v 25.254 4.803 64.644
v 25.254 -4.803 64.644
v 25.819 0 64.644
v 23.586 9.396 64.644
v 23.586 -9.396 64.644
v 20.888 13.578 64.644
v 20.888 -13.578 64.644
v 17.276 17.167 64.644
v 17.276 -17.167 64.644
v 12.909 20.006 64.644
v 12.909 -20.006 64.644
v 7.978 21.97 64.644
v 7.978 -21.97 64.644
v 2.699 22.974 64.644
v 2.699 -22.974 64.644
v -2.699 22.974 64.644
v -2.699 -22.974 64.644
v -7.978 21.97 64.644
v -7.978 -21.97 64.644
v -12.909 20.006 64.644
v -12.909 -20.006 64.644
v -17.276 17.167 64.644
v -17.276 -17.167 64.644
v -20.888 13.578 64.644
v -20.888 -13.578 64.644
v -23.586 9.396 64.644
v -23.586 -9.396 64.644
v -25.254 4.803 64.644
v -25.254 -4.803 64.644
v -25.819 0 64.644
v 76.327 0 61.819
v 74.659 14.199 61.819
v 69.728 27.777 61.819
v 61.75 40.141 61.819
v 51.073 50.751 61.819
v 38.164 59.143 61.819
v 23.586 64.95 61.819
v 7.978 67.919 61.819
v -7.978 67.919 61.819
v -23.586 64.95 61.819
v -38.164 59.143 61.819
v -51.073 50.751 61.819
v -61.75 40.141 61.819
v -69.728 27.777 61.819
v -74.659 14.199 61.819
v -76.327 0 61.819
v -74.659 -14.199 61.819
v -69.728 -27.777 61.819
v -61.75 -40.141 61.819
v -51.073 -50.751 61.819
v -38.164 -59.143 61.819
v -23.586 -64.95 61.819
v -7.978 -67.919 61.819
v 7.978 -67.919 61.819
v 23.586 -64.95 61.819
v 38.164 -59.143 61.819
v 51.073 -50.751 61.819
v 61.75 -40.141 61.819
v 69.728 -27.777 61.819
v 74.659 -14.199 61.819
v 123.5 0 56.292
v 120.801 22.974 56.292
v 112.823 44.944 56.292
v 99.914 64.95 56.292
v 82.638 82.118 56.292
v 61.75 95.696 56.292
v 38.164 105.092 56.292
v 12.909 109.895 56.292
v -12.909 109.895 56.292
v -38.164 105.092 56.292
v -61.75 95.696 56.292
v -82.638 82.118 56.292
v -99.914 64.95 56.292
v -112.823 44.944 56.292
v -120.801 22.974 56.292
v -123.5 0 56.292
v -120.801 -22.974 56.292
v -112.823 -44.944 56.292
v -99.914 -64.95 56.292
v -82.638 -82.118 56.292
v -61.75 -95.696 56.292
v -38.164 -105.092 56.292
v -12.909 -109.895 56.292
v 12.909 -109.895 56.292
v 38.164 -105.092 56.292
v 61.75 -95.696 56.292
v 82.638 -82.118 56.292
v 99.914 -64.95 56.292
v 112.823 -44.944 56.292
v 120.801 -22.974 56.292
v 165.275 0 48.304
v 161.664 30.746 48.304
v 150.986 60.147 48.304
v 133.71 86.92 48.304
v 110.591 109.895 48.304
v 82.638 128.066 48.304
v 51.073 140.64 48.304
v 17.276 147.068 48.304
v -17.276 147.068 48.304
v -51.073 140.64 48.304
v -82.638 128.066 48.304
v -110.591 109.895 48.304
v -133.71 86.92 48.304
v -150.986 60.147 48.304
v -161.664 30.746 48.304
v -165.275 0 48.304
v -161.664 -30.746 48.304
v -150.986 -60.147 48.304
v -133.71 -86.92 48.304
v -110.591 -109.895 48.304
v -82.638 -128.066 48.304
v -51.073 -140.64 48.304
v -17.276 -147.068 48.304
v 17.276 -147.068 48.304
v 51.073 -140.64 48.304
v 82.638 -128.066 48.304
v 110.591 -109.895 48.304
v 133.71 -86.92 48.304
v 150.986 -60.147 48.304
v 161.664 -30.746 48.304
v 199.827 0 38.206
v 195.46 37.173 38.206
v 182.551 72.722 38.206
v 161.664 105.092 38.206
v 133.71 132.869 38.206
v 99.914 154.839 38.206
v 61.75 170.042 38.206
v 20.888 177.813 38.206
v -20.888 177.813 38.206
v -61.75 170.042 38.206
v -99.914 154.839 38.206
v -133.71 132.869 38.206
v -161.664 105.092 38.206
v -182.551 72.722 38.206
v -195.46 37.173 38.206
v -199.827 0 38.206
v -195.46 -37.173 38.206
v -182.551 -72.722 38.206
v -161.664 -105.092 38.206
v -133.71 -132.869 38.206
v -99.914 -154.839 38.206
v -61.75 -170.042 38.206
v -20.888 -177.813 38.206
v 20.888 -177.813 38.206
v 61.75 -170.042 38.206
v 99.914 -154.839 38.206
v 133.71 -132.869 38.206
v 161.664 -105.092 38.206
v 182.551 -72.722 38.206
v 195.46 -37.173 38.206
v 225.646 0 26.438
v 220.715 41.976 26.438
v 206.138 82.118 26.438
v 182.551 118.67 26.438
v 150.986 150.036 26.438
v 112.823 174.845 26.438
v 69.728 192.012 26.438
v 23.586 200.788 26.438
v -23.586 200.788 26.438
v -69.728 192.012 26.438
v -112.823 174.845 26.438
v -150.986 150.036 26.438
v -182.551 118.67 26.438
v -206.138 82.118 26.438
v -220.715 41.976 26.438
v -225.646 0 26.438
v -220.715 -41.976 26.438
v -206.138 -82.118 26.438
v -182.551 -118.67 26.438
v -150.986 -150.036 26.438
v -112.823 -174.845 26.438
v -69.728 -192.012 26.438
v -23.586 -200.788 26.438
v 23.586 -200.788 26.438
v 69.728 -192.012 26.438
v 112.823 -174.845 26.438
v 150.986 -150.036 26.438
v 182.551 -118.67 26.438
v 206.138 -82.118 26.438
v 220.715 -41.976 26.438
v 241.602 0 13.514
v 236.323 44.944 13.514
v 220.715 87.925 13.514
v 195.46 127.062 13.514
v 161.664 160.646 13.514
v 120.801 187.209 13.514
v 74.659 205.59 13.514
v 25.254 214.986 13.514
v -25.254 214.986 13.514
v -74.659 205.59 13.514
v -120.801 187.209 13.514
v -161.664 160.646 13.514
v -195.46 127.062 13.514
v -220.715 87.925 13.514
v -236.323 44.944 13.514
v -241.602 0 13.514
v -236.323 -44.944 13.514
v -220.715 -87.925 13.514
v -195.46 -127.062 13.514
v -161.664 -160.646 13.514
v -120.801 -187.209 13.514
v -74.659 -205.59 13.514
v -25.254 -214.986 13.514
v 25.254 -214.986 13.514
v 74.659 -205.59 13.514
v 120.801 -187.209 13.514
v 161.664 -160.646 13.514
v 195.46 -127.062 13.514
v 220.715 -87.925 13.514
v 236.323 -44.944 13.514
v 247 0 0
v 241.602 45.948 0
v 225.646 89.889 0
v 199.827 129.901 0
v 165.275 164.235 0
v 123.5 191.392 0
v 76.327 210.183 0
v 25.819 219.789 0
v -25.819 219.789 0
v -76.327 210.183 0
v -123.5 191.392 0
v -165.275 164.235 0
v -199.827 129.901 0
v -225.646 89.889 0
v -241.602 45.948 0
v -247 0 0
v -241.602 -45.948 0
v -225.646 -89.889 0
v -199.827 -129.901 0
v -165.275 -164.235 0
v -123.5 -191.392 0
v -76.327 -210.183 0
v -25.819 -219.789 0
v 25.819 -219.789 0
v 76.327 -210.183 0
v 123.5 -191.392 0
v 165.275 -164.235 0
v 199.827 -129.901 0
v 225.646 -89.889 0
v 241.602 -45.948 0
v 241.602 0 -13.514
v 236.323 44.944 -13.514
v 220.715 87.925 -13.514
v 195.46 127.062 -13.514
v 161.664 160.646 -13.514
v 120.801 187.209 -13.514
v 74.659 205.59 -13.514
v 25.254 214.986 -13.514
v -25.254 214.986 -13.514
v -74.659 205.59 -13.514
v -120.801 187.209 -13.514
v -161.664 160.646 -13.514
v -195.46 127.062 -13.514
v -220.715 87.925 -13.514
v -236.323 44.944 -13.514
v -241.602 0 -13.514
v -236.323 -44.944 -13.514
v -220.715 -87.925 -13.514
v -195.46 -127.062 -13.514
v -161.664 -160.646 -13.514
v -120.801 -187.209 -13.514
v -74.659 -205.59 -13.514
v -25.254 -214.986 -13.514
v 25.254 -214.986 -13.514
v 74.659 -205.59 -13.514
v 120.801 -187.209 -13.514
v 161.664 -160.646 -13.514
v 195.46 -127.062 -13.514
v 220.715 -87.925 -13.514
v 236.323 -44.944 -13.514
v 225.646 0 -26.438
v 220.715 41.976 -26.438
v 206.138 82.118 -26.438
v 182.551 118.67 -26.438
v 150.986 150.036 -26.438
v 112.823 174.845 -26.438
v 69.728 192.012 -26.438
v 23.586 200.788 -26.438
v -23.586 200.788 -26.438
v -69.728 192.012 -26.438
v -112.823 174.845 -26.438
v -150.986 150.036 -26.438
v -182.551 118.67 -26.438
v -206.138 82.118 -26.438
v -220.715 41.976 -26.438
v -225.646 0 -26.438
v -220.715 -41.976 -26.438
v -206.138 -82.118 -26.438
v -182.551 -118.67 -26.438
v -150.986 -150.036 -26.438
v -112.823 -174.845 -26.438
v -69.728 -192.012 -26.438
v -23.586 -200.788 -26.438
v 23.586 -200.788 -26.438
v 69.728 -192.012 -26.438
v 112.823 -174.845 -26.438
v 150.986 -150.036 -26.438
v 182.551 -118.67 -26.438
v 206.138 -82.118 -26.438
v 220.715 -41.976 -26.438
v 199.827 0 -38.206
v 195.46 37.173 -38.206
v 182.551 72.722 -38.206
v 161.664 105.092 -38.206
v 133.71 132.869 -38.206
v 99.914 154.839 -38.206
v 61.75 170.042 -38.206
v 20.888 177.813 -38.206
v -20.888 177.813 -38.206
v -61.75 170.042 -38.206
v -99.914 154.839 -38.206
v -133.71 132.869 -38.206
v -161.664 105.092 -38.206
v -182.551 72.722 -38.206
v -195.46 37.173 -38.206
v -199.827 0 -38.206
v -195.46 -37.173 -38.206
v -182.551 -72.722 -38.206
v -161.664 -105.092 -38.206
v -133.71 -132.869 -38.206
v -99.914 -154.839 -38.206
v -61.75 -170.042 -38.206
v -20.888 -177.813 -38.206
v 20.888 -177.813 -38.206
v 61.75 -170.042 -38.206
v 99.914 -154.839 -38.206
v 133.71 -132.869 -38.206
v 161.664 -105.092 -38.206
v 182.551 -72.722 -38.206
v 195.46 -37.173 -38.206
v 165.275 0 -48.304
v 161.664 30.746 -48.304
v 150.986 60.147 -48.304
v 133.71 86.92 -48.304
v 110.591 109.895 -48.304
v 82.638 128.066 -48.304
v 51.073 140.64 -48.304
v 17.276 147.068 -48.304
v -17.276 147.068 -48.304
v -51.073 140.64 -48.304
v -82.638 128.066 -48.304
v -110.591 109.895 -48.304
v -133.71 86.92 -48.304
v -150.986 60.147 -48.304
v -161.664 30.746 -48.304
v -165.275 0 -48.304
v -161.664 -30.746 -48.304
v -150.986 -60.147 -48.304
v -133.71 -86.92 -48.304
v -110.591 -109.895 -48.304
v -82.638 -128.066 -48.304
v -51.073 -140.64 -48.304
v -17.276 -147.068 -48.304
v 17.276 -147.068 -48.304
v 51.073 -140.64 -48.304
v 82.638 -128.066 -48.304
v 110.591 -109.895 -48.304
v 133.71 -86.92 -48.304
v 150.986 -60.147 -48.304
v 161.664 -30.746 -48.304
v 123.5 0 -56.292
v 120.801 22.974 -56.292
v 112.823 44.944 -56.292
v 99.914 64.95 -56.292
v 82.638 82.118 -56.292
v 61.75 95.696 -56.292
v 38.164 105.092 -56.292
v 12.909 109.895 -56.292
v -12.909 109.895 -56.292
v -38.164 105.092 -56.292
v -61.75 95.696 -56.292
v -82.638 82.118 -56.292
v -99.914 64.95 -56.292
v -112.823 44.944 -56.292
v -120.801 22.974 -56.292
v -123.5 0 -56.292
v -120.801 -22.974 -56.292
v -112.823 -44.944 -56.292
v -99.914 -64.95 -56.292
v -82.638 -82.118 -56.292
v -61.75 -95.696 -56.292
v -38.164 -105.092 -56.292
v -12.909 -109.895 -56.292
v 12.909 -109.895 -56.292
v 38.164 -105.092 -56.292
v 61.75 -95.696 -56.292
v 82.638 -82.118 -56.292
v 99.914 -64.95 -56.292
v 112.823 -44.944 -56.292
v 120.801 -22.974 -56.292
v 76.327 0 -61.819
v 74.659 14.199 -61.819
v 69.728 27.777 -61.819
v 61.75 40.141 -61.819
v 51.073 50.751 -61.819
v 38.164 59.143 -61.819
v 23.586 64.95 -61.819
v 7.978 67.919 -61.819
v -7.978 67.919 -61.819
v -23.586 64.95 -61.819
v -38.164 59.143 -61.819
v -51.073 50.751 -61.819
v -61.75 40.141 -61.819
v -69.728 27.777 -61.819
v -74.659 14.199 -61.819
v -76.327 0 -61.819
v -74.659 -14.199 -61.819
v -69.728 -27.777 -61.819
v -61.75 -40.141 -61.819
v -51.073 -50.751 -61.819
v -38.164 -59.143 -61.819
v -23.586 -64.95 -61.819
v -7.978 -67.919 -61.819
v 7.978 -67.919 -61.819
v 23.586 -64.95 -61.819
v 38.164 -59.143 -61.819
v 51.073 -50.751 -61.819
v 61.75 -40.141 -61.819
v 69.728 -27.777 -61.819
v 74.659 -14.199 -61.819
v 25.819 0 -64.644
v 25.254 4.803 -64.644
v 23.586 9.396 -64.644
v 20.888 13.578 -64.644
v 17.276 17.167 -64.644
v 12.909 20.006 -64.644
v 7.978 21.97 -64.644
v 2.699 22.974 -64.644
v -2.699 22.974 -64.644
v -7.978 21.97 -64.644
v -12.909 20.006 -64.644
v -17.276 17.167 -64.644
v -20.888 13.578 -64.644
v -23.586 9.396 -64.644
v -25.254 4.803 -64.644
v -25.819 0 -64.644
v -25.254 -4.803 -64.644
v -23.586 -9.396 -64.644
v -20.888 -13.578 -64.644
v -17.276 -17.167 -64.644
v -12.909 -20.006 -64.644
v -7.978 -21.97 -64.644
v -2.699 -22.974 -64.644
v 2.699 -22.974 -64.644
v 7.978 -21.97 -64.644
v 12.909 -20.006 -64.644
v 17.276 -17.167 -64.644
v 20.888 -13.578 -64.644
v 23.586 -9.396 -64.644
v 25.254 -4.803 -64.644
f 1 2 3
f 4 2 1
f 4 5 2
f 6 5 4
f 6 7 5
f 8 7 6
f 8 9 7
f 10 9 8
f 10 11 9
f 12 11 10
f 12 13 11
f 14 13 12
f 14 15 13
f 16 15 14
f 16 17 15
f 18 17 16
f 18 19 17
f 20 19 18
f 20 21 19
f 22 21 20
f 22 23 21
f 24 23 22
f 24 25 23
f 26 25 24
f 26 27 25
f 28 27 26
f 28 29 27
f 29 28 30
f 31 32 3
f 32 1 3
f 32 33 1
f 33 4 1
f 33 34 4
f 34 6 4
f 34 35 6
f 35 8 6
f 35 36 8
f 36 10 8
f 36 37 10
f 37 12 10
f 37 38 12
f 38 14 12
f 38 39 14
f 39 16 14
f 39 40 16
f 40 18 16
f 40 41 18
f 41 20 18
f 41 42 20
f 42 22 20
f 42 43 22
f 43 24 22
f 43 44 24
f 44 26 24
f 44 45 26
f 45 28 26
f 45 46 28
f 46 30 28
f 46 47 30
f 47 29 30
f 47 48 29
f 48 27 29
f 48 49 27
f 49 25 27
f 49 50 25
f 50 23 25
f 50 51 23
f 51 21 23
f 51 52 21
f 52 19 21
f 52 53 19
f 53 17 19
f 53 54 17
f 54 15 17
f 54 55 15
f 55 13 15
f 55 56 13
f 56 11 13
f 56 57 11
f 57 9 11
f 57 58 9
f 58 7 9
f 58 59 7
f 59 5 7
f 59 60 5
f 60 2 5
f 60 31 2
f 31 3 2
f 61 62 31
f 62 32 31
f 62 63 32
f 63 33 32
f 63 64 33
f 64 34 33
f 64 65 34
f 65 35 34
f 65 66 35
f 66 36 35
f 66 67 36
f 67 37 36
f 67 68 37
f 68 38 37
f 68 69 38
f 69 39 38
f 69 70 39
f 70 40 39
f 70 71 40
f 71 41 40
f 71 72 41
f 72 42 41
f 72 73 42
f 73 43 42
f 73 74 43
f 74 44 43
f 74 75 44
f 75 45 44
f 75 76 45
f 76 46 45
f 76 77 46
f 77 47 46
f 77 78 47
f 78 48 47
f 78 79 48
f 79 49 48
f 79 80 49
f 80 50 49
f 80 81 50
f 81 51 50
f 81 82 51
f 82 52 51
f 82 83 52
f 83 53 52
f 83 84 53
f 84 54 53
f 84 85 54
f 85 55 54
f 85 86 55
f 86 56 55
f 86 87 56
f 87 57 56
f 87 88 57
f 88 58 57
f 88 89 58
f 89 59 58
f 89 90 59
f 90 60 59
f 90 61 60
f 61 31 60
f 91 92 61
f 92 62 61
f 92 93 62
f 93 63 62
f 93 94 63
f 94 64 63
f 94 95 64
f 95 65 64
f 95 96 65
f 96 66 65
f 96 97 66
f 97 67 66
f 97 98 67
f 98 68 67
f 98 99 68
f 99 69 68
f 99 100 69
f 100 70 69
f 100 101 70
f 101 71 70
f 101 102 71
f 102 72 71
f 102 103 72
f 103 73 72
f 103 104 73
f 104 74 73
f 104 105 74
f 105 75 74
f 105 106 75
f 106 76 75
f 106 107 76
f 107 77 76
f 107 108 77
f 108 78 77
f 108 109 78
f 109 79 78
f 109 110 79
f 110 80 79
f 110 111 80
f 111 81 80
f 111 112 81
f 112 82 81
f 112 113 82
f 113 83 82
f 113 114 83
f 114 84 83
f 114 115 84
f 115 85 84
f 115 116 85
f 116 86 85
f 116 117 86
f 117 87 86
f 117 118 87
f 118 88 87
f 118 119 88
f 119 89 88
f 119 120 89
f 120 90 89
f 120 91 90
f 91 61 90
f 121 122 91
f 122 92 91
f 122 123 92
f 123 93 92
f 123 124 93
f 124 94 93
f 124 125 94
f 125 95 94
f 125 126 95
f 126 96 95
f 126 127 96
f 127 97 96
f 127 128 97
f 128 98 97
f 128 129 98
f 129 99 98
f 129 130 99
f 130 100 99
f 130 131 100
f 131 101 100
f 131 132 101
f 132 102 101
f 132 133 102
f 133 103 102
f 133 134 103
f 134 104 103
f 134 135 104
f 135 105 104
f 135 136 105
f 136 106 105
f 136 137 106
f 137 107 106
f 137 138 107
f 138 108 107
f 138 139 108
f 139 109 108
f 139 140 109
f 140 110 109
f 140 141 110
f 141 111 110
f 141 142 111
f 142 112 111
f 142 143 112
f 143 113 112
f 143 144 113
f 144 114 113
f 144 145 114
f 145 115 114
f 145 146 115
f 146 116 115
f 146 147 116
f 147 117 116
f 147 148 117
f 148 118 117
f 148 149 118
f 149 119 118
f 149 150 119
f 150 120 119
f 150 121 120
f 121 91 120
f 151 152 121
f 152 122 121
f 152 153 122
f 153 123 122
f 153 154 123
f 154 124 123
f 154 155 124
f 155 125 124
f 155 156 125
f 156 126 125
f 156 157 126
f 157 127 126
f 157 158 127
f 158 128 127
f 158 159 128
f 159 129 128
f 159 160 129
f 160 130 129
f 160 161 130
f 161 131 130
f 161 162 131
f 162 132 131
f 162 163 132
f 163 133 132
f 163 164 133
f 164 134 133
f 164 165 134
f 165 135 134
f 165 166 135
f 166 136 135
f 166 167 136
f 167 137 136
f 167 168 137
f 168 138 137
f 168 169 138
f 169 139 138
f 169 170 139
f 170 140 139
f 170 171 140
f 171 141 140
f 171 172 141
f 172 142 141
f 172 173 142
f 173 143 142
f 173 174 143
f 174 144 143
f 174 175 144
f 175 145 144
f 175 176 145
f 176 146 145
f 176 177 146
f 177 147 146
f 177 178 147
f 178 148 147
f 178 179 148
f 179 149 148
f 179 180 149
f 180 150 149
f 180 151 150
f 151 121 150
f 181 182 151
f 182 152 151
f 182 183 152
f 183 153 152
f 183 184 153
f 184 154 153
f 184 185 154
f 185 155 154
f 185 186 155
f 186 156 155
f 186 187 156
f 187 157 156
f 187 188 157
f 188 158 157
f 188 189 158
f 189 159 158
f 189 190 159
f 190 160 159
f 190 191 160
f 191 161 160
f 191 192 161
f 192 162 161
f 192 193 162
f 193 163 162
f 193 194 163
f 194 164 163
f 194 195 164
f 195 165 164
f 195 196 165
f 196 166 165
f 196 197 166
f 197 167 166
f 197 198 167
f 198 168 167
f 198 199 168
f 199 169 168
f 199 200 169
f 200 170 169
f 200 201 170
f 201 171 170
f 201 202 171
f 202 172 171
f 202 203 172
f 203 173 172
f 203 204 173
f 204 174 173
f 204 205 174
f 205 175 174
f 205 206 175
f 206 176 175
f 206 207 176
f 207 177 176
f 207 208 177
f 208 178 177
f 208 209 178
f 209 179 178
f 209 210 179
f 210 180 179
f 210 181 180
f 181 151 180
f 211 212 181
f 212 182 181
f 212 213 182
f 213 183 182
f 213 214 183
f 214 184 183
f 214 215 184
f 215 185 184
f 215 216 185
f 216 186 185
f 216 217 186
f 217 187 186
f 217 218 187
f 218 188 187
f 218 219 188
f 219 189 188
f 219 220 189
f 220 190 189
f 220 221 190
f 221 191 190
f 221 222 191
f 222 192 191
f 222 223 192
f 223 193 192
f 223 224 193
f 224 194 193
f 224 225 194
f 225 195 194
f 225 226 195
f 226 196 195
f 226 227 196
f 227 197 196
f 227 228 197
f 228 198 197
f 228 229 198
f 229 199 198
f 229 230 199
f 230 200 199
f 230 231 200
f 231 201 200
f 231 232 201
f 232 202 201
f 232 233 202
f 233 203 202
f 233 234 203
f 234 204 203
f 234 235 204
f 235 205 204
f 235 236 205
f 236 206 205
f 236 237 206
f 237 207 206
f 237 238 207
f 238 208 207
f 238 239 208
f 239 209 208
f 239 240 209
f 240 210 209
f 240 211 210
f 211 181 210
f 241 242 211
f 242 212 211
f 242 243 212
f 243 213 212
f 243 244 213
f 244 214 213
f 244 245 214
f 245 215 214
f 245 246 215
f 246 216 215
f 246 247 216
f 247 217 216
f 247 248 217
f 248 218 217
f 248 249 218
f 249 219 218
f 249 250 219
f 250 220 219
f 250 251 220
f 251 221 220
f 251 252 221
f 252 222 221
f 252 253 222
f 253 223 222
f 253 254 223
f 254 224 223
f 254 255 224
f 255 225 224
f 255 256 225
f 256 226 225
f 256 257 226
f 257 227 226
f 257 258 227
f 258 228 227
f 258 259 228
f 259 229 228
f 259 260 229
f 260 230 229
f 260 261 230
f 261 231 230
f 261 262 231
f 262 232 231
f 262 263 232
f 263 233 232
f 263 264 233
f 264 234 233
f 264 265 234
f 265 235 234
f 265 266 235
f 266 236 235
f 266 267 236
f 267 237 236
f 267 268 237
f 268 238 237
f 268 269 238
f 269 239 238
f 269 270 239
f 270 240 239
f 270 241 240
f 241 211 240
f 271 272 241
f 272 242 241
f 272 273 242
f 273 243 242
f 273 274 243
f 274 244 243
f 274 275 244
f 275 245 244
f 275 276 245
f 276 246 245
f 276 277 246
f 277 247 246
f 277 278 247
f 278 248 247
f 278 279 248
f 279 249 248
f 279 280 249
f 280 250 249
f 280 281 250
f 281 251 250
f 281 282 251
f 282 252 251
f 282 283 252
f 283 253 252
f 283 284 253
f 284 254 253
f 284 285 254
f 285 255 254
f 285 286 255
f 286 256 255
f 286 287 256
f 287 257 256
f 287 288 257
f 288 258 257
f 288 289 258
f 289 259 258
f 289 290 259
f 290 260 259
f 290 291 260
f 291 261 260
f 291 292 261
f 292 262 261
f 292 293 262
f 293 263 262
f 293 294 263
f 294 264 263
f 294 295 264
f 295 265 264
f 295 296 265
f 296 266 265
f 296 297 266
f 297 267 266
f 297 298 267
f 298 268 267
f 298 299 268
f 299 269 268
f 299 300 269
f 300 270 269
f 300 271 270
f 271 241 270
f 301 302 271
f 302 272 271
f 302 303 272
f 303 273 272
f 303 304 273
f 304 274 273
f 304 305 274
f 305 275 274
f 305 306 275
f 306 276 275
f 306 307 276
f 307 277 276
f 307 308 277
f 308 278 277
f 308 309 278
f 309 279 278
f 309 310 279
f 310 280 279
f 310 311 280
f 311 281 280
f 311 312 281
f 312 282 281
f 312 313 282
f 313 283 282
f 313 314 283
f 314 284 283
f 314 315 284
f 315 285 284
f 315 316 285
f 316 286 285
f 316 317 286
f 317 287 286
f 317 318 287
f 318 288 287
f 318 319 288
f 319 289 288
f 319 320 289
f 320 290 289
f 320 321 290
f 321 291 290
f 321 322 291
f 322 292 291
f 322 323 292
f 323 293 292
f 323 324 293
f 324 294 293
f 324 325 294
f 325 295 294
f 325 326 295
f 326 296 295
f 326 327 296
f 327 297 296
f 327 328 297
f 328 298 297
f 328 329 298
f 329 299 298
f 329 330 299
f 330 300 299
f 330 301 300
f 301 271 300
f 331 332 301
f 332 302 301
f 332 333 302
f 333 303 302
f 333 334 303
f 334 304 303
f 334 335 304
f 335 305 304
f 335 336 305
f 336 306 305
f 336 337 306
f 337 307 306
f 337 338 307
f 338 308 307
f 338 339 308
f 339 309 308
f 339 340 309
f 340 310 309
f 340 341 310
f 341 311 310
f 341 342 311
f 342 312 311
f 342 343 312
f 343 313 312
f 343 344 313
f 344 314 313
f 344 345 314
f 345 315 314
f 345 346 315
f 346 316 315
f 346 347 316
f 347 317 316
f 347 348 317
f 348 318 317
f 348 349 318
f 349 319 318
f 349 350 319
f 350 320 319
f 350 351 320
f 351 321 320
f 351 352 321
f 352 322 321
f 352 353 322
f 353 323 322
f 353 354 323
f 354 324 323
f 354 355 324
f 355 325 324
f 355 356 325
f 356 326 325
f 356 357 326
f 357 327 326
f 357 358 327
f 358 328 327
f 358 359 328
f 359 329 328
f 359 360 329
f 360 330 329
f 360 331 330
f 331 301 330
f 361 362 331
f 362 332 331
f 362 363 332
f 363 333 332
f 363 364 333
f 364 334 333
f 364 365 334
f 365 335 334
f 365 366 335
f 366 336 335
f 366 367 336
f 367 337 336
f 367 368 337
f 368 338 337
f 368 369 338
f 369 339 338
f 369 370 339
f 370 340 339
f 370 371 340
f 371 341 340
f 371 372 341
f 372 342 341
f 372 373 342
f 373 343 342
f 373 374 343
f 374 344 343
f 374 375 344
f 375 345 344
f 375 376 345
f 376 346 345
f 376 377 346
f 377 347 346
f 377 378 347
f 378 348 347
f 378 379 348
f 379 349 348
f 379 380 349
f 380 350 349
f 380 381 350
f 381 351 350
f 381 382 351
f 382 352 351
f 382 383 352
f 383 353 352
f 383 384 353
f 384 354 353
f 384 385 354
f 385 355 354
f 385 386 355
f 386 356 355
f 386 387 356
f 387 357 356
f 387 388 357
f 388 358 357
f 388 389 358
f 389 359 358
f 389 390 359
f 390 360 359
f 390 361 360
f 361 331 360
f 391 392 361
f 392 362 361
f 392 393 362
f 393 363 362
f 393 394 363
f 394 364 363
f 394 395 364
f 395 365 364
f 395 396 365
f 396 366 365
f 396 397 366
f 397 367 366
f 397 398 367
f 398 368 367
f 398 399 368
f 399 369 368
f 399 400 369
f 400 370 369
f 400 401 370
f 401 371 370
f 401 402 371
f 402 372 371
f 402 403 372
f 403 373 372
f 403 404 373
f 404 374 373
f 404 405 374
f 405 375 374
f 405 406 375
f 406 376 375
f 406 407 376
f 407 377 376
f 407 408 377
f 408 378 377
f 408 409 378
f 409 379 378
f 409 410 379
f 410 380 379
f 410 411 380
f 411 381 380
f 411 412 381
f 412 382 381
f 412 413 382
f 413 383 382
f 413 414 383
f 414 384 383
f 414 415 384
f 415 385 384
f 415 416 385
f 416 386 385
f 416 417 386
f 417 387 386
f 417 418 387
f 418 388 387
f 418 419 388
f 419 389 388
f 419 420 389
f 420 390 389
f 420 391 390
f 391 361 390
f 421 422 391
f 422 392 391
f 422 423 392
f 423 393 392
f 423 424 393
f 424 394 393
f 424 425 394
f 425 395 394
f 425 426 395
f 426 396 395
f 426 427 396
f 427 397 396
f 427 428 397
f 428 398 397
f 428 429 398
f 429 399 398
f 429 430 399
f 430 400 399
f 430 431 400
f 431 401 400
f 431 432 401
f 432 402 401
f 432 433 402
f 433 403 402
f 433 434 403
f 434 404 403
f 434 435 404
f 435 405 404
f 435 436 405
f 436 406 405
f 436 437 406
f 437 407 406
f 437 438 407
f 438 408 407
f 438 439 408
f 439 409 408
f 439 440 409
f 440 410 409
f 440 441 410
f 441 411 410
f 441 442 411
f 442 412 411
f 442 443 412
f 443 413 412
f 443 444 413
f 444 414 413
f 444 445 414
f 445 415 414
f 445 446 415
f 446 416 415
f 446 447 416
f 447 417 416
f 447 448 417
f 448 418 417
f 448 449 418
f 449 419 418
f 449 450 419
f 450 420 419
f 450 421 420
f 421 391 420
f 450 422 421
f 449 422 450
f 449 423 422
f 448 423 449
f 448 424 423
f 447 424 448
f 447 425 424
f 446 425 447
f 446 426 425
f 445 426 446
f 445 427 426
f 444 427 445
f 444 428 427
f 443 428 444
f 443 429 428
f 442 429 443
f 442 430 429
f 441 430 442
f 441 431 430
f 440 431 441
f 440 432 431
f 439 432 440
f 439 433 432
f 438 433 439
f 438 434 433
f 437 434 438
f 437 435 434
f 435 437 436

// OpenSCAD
// Generated by SolidPython 1.0.1 on 2020-07-29 00:46:54


scale(v = [19, 17, 5]) {
	sphere(r = 13);
}
/***********************************************
*********      SolidPython code:      **********
************************************************
 
# import packages: SolidPython
from solid import *
from solid.utils import *
from itertools import chain, combinations, permutations


class Resize:

    def __init__(self, scad_file):
        self.scad_file = scad_file
        #self.scad_file = import_scad(scad_file)
        # cone/cylinder param:
        self.r1 = 0
        self.r2 = 0
        self.h = 0
        # rectangular prism param:
        self.w = 0
        self.l = 0
        # ellipse param:
        self.r = 0

    # import OpenScad code (file name corresponds to shape)


    # classify shape + parameters
    def assign(self, param1, param2, param3):
        if self.scad_file == 'cone.scad':
            self.r1 = param1
            self.r2 = param2
            self.h = param3
        elif self.scad_file == 'cylinder.scad':
            self.r1 = param1
            self.r2 = param2
            self.h = param3
        elif self.scad_file == 'rectangularPrism.scad':
            self.h = param1
            self.l = param2
            self.w = param3
        else:
            self.r = param1
            self.h = param2

    # resize parameters
    def iterate(self):
        x = range(3, 20, 2)
        i = 1
        if self.scad_file == 'cone.scad':
            tempList = list(permutations(x, 2))
            for temp in tempList:
                param1 = temp[0]
                param2 = temp[1]
                filepath = 'produced_scad_files/' + 'cone' + str(param1) + '_' + str(param2) + '_' + '.scad'
                scad_render_to_file(cylinder(h=param1, r1=param2, r2=0), filepath)

        elif self.scad_file == 'cylinder.scad':
            tempList = list(permutations(x, 3))
            for temp in tempList:
                param1 = temp[0]
                param2 = temp[1]
                filepath = 'produced_scad_files/' + 'cylinder' + str(param1) + '_' + str(param2) + '_' + '.scad'
                scad_render_to_file(cylinder(h=param1, r1=param2, r2=param2), filepath)

        elif self.scad_file == 'rectangularPrism.scad':
            tempList = list(permutations(x, 3))
            for temp in tempList:
                param1 = temp[0]
                param2 = temp[1]
                param3 = temp[2]
                filepath = 'produced_scad_files/' + 'rectangularPrism' + str(param1) + '_' + str(param2) + '_' + str(
                    param3) + '.scad'
                scad_render_to_file(cube(size=(param1, param2, param3)), filepath)

        elif self.scad_file == 'ellipse.scad':
            tempList = list(permutations(x, 4))
            for temp in tempList:
                param1 = temp[0]
                param2 = temp[1]
                param3 = temp[2]
                param4 = temp[3]
                filepath = 'produced_scad_files/' + 'ellipse' + str(param1) + '_' + str(param2) + '_' + str(param3) + '_' + str(param4) + '.scad'
                scad_render_to_file(scale([param1, param2, param3])(sphere(r=param4)), filepath)

    def render_to_scadfile(self):
        scad_render_to_file(scad, 'example.scad') 
 
************************************************/
